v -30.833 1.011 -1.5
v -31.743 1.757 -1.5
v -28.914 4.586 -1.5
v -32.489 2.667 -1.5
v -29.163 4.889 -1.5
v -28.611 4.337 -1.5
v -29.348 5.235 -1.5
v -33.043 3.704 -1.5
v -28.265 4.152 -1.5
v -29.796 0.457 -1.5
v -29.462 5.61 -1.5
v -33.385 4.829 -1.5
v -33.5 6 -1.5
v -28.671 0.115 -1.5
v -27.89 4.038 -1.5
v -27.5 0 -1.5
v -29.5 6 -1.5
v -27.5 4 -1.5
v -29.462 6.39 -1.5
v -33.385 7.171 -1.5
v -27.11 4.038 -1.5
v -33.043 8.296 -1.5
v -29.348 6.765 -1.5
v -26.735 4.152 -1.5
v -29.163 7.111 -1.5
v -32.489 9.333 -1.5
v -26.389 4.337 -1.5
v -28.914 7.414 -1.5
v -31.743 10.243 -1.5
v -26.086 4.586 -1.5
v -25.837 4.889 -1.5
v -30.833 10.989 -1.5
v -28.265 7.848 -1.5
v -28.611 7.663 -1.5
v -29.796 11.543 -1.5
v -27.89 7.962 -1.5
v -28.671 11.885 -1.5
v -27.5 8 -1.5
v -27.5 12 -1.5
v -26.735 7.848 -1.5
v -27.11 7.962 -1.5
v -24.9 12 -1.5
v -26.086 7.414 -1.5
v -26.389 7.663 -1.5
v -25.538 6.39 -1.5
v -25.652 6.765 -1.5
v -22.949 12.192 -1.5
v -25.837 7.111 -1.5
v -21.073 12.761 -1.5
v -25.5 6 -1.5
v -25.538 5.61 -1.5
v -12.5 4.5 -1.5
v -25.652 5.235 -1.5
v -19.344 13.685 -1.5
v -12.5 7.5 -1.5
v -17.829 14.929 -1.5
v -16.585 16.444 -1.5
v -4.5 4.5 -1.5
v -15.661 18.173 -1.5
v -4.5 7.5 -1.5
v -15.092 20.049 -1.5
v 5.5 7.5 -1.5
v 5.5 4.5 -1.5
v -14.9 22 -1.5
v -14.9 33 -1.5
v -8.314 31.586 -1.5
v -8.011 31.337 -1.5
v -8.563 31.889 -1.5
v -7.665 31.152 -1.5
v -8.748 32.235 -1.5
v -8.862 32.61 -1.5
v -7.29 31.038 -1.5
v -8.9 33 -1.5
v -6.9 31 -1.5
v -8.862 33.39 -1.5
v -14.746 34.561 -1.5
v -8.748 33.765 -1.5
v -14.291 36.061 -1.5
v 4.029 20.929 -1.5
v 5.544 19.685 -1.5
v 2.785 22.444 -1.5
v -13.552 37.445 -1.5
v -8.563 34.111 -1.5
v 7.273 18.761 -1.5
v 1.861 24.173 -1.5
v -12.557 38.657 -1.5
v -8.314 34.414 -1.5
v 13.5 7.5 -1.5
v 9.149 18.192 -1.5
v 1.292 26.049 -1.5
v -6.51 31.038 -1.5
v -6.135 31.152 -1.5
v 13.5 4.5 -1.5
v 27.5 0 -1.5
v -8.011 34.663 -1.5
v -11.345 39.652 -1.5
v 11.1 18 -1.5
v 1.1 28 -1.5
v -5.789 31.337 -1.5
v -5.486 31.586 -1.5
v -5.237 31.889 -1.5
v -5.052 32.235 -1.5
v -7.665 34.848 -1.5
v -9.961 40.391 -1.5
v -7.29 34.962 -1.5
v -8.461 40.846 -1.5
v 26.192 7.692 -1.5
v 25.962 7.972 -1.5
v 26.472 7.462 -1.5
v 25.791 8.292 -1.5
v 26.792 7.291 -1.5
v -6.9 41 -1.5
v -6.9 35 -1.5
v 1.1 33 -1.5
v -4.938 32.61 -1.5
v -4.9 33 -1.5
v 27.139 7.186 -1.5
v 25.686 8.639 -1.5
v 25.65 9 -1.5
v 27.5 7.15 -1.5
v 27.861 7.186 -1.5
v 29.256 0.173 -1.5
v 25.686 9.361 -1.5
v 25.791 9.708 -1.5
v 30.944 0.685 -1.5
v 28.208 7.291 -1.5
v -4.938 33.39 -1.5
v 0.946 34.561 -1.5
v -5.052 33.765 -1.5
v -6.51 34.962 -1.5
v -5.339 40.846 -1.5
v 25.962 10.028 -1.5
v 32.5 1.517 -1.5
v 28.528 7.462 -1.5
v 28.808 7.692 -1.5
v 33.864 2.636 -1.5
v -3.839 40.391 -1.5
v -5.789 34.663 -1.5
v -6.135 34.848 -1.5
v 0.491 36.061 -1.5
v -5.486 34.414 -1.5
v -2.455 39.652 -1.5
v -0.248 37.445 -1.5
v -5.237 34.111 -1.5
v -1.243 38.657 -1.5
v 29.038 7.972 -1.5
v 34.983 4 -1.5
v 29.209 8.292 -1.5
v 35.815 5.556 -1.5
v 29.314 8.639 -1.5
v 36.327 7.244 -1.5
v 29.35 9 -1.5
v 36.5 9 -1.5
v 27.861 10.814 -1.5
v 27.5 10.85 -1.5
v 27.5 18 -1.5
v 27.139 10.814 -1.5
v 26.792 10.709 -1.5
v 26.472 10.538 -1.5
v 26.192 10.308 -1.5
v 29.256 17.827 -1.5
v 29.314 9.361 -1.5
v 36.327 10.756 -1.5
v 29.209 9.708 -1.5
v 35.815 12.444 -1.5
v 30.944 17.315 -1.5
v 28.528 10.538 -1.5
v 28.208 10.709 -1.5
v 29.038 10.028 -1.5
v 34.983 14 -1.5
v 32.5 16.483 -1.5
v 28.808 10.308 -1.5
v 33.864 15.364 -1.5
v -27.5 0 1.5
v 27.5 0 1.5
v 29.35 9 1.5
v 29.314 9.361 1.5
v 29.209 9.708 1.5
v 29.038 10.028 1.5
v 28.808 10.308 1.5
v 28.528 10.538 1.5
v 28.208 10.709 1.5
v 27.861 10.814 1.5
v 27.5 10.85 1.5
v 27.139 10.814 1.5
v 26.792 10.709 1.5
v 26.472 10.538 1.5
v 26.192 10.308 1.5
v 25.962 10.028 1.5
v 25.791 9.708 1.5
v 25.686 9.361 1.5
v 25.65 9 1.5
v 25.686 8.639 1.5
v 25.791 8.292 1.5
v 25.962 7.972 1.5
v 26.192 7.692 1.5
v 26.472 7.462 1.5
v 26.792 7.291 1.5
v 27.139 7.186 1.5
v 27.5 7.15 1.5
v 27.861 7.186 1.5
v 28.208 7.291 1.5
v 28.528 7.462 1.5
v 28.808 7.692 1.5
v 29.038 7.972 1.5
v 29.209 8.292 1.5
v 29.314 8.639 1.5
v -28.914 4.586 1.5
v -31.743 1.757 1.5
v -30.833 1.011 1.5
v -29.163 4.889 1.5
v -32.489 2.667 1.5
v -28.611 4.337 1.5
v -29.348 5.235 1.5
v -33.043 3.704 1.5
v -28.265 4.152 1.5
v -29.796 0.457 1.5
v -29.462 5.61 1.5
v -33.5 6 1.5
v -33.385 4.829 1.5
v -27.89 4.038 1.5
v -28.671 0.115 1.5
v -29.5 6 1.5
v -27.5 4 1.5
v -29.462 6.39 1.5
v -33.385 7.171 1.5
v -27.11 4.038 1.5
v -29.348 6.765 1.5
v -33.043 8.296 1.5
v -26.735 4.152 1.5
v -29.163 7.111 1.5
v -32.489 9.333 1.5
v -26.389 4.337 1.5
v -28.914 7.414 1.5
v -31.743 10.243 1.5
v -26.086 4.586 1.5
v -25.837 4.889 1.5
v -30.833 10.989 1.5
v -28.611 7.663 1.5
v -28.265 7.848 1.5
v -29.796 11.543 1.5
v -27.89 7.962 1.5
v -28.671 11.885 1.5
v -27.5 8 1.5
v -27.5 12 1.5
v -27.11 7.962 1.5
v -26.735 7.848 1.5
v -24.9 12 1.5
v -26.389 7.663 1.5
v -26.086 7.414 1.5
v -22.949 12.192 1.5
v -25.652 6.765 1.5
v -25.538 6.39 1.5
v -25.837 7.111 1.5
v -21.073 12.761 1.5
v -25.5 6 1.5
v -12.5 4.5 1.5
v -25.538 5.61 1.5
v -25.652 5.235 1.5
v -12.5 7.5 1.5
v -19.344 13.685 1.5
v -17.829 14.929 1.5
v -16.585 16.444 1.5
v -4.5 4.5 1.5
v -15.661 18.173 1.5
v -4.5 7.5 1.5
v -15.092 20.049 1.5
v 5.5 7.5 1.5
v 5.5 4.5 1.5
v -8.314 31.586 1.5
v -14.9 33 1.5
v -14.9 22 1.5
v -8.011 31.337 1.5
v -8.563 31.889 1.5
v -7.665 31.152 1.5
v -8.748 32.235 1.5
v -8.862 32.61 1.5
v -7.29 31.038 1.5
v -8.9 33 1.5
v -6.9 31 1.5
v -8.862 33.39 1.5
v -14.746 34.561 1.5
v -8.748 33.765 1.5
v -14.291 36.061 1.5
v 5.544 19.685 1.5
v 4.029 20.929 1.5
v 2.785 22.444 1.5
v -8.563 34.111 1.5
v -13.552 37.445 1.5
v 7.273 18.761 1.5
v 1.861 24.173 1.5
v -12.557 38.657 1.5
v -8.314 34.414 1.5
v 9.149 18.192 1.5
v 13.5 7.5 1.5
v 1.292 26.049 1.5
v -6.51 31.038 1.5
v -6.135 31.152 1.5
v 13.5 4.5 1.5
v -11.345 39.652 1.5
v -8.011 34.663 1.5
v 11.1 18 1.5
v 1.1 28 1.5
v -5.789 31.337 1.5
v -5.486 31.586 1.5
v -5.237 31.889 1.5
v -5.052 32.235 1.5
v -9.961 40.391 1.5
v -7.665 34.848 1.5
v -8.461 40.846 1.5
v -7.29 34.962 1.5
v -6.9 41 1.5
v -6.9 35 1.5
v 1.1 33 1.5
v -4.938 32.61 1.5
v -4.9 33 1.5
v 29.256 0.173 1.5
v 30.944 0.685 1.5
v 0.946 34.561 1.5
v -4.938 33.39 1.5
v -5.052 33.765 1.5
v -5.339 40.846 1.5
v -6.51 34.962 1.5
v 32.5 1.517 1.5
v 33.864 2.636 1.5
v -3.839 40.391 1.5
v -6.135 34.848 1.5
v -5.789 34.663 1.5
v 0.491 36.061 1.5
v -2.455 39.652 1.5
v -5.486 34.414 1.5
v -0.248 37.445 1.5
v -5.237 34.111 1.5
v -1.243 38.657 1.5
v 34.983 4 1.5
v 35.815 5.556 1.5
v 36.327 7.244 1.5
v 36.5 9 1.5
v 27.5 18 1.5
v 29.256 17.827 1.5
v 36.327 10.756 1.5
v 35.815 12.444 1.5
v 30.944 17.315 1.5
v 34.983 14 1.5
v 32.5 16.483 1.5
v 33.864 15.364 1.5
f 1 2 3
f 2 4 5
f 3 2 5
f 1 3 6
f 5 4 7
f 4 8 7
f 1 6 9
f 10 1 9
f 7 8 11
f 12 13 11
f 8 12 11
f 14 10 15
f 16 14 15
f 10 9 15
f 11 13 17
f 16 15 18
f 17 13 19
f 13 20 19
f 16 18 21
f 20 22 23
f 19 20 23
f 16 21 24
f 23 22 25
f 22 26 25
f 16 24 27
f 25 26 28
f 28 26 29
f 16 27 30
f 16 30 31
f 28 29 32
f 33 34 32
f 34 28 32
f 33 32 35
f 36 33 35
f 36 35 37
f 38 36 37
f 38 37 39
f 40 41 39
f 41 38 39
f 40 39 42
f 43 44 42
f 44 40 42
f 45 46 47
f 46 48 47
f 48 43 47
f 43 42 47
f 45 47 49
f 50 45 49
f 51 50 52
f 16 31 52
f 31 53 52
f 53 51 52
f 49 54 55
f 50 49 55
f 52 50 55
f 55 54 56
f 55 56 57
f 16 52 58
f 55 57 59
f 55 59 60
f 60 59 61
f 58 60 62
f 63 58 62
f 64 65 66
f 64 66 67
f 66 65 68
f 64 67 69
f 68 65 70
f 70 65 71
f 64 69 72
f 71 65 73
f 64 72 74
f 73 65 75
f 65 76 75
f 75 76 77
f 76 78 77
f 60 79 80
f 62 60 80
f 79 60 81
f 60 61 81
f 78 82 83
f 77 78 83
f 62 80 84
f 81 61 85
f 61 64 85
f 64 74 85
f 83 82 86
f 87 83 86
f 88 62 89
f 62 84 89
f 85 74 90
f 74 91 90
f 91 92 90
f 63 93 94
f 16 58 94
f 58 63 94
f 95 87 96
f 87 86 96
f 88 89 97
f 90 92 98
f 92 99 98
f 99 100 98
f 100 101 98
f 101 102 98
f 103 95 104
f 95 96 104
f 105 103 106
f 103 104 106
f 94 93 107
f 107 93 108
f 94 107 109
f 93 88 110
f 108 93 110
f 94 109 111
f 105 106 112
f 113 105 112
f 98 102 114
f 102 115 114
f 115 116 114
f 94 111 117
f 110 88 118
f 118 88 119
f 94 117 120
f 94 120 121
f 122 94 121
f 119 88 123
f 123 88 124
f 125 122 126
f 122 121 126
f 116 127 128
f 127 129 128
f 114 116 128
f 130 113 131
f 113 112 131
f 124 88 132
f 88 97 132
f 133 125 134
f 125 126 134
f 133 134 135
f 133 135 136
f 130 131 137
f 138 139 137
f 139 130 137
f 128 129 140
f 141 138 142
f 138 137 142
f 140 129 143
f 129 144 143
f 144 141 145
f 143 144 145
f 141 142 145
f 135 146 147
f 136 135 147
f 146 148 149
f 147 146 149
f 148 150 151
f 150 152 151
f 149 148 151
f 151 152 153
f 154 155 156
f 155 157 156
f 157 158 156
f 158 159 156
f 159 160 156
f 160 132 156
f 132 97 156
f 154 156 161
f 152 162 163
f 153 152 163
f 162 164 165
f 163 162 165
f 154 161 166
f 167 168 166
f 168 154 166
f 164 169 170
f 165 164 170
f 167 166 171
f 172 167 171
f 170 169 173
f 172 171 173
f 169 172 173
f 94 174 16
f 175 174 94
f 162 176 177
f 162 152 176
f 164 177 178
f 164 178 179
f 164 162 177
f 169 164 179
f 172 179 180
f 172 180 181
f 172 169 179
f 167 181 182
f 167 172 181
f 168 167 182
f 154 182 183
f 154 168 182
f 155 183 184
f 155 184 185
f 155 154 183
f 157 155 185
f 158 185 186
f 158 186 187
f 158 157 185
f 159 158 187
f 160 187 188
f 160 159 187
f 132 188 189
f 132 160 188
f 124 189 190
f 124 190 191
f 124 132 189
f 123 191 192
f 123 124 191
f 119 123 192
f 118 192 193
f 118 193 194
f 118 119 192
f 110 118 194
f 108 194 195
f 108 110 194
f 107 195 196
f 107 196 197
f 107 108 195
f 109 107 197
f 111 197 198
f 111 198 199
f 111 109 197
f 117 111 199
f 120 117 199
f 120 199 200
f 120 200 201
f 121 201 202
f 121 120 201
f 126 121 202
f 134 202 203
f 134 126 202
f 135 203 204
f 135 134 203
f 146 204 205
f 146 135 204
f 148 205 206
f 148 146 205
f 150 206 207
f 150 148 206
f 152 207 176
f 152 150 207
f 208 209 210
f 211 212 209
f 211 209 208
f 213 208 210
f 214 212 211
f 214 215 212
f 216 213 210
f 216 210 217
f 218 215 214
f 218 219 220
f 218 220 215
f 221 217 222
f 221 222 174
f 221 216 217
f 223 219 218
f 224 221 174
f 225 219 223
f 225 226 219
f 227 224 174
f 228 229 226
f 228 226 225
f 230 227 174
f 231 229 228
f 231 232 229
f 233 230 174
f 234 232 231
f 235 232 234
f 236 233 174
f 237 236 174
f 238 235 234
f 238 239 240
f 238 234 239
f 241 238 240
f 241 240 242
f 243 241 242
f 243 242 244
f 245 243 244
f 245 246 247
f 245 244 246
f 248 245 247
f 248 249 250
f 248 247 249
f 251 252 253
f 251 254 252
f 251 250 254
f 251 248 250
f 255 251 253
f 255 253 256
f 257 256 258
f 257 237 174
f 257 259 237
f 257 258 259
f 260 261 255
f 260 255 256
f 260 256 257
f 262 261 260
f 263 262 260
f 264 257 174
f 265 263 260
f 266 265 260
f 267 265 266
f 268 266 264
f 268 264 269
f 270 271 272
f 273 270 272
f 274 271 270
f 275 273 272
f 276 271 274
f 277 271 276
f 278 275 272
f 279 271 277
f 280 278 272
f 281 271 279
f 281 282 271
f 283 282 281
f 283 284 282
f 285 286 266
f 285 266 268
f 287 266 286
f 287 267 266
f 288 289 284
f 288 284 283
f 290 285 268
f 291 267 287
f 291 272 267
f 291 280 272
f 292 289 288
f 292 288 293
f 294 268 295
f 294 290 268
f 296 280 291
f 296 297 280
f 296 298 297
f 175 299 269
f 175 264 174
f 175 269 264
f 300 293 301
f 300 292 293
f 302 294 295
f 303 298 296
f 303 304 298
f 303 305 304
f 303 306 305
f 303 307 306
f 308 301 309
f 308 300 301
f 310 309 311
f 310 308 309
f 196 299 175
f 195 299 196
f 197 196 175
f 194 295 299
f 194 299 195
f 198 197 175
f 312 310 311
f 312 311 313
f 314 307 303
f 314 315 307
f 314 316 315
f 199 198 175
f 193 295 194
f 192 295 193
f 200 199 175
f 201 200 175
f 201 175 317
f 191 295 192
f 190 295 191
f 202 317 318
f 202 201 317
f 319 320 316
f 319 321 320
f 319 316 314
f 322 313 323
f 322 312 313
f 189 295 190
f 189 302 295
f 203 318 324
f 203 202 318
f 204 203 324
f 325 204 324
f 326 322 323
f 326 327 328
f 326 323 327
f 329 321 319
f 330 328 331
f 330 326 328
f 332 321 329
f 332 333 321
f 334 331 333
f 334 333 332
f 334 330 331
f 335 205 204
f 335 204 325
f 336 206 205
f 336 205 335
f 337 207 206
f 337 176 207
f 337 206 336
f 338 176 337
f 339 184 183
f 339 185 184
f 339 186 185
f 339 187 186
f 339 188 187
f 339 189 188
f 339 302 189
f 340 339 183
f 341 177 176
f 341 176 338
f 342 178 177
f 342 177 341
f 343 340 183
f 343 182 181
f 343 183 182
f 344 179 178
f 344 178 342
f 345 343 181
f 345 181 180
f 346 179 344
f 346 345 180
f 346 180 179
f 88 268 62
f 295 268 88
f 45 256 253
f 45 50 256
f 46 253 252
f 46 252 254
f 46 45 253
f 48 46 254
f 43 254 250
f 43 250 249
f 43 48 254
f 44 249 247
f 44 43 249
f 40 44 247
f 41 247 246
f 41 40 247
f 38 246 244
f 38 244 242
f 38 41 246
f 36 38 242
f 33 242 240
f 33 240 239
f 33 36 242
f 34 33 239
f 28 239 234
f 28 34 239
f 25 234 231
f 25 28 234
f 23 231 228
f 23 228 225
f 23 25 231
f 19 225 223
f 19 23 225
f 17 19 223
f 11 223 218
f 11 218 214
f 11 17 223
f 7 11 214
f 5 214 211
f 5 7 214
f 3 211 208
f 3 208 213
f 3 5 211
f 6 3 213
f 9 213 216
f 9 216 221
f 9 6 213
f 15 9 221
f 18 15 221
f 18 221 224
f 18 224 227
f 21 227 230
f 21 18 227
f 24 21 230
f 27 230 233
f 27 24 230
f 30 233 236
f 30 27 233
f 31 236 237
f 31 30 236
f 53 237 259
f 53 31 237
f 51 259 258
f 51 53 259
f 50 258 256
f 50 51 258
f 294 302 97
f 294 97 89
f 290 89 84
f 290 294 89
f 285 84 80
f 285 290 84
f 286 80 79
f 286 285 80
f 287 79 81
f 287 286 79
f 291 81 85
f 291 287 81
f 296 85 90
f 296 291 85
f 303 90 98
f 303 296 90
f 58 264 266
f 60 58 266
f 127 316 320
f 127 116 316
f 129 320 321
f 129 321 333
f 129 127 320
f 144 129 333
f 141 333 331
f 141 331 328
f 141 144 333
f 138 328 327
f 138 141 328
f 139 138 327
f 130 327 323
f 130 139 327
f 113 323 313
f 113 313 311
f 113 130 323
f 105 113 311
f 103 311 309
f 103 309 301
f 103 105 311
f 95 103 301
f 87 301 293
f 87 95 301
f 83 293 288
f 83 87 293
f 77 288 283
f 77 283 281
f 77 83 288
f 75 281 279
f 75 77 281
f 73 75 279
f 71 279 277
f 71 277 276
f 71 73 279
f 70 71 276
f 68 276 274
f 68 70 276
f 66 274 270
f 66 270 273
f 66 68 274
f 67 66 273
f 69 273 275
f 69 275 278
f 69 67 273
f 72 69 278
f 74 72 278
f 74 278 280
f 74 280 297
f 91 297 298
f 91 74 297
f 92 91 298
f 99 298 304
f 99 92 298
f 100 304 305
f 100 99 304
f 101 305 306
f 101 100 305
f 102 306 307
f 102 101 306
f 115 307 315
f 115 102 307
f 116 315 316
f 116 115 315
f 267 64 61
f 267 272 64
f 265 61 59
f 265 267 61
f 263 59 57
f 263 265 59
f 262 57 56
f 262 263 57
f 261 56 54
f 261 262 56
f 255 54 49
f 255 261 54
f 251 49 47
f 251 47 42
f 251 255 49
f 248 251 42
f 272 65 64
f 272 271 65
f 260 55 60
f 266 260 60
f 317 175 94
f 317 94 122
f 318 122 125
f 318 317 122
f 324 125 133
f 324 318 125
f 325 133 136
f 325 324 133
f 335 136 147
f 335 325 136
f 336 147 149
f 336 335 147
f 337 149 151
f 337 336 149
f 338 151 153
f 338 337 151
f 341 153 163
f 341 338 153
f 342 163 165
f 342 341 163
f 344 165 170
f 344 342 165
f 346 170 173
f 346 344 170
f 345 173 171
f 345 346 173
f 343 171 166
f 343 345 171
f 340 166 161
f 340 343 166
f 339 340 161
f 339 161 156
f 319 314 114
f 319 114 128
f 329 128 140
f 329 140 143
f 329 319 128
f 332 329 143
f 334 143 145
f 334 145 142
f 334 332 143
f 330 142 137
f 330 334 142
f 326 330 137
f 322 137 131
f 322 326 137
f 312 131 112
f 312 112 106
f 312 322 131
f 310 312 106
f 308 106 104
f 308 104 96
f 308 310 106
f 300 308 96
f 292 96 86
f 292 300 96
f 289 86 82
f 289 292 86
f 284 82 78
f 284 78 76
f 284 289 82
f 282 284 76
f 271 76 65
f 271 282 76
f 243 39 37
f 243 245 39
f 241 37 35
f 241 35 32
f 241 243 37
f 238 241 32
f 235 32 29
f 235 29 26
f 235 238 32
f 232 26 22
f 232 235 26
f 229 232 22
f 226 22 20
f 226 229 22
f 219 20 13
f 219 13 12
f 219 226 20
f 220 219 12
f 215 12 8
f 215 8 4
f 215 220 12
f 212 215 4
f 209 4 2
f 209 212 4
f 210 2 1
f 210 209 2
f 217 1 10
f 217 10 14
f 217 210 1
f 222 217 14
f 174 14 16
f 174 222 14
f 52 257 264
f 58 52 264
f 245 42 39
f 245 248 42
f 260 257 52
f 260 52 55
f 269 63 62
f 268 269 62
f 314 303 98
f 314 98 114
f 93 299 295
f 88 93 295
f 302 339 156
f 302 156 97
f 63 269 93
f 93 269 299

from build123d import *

# Parameters (mm, degrees)
SKETCH1_R           = 2
SKETCH1_R_2         = 1.85
SKETCH1_W           = 8
SKETCH1_H           = 3
BOSS_EXTRUDE1_DEPTH = 1.5


with BuildPart() as part:
    # Sketch1 → Boss-Extrude1 (new body, symmetric)
    with BuildSketch(Plane.XY):
        with BuildLine():
            Line((-27.5, 0), (27.5, 0))
            ThreePointArc((27.5, 0), (36.5, 9), (27.5, 18))
            Line((27.5, 18), (11.1, 18))
            ThreePointArc((11.1, 18), (4.028932188, 20.928932188), (1.1, 28))
            Line((1.1, 28), (1.1, 33))
            ThreePointArc((1.1, 33), (-6.9, 41), (-14.9, 33))
            Line((-14.9, 33), (-14.9, 22))
            ThreePointArc((-14.9, 22), (-17.828932188, 14.928932188), (-24.9, 12))
            Line((-24.9, 12), (-27.5, 12))
            ThreePointArc((-27.5, 12), (-33.5, 6), (-27.5, 0))
        make_face()
        with Locations((-27.5, 6)):
            Circle(SKETCH1_R, mode=Mode.SUBTRACT)
        with Locations((27.5, 9)):
            Circle(SKETCH1_R_2, mode=Mode.SUBTRACT)
        with Locations((-6.9, 33)):
            Circle(SKETCH1_R, mode=Mode.SUBTRACT)
        with Locations((-8.5, 6)):
            Rectangle(SKETCH1_W, SKETCH1_H, mode=Mode.SUBTRACT)
        with Locations((9.5, 6)):
            Rectangle(SKETCH1_W, SKETCH1_H, mode=Mode.SUBTRACT)
    extrude(amount=BOSS_EXTRUDE1_DEPTH, both=True)


solid = part.part
